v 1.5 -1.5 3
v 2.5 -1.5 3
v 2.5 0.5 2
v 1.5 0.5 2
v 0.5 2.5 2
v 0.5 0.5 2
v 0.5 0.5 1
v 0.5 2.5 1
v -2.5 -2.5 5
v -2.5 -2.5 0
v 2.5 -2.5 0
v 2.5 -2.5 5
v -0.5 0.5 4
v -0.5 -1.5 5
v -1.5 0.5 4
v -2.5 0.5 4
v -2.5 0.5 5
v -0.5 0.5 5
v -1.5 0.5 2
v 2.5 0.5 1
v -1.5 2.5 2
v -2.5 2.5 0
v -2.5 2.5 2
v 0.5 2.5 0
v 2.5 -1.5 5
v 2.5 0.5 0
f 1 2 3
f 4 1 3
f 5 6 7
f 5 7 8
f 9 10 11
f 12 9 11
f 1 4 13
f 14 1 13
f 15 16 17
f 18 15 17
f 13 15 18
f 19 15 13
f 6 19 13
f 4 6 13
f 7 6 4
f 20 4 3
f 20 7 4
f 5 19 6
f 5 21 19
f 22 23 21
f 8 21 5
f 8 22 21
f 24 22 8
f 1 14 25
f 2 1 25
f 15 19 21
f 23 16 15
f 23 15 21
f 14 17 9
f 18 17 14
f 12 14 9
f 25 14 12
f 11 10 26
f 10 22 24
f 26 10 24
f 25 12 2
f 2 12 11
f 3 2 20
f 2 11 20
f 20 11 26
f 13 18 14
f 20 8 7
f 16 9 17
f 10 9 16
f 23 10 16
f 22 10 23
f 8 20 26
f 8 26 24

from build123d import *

# Parameters (mm, degrees)
SKETCH1_W           = 5
SKETCH1_H           = 5
BOSS_EXTRUDE1_DEPTH = 5
CUT_EXTRUDE1_DEPTH  = 2
CUT_EXTRUDE2_DEPTH  = 1
SKETCH4_W           = 3
SKETCH4_H           = 2
CUT_EXTRUDE3_DEPTH  = 3
SKETCH5_W           = 2
SKETCH5_H           = 2
CUT_EXTRUDE4_DEPTH  = 1
CUT_EXTRUDE5_DEPTH  = 1
CUT_EXTRUDE6_DEPTH  = 2
CUT_EXTRUDE7_DEPTH  = 1
CUT_EXTRUDE8_DEPTH  = 3
CUT_EXTRUDE9_DEPTH  = 3


with BuildPart() as part:
    # Sketch1 → Boss-Extrude1 (new body)
    with BuildSketch(Plane.XY):
        Rectangle(SKETCH1_W, SKETCH1_H)
    extrude(amount=BOSS_EXTRUDE1_DEPTH)

    # Sketch2 → Cut-Extrude1 (cut)
    with BuildSketch(Plane(origin=(0, 2.5, 0), x_dir=(1, 0, 0), z_dir=(0, 1, 0))):
        Polygon((-2.5, -5), (-0.5, -5), (-0.5, -2), (-1.5, -2), (-1.5, -4), (-2.5, -4), align=None)
    extrude(amount=-CUT_EXTRUDE1_DEPTH, mode=Mode.SUBTRACT)

    # Sketch3 → Cut-Extrude2 (cut)
    with BuildSketch(Plane.ZY.offset(2.5)):
        Polygon((4, 0.5), (2, 2.5), (4, 2.5), align=None)
    extrude(amount=-CUT_EXTRUDE2_DEPTH, mode=Mode.SUBTRACT)

    # Sketch4 → Cut-Extrude3 (cut)
    with BuildSketch(Plane.XY.offset(5)):
        with Locations((1, 1.5)):
            Rectangle(SKETCH4_W, SKETCH4_H)
    extrude(amount=-CUT_EXTRUDE3_DEPTH, mode=Mode.SUBTRACT)

    # Sketch5 → Cut-Extrude4 (cut)
    with BuildSketch(Plane.XY.offset(2)):
        with Locations((1.5, 1.5)):
            Rectangle(SKETCH5_W, SKETCH5_H)
    extrude(amount=-CUT_EXTRUDE4_DEPTH, mode=Mode.SUBTRACT)

    # Sketch6 → Cut-Extrude5 (cut)
    with BuildSketch(Plane.XY.offset(1)):
        Polygon((2.5, 0.5), (0.5, 2.5), (2.5, 2.5), align=None)
    extrude(amount=-CUT_EXTRUDE5_DEPTH, mode=Mode.SUBTRACT)

    # Sketch7 → Cut-Extrude6 (cut)
    with BuildSketch(Plane(origin=(0, 0.5, 0), x_dir=(1, 0, 0), z_dir=(0, 1, 0))):
        Polygon((2.5, -5), (2.5, -3), (1.5, -3), (-0.5, -5), align=None)
    extrude(amount=-CUT_EXTRUDE6_DEPTH, mode=Mode.SUBTRACT)

    # Sketch8 → Cut-Extrude7 (cut)
    with BuildSketch(Plane(origin=(2.5, 0, 0), x_dir=(0, 0, -1), z_dir=(1, 0, 0))):
        Polygon((-3, -1.5), (-2, 0.5), (-3, 0.5), align=None)
    extrude(amount=-CUT_EXTRUDE7_DEPTH, mode=Mode.SUBTRACT)

    # Sketch9 → Cut-Extrude8 (cut)
    with BuildSketch(Plane(origin=(2.5, 0, 0), x_dir=(0, 0, -1), z_dir=(1, 0, 0))):
        Polygon((-5, -1.5), (-4, 0.5), (-5, 0.5), align=None)
    extrude(amount=-CUT_EXTRUDE8_DEPTH, mode=Mode.SUBTRACT)

    # Sketch11 → Cut-Extrude9 (cut)
    with BuildSketch(Plane(origin=(1.666666667, 0.833333333, 1.666666667), x_dir=(-0.745355992, 0.298142397, 0.596284794), z_dir=(-0.666666667, -0.333333333, -0.666666667))):
        Polygon((2.906888371, -1.341640786), (0.223606798, -0.447213595), (0.223606798, -2.683281573), (2.906888371, -3.577708764), align=None)
    extrude(amount=-CUT_EXTRUDE9_DEPTH, mode=Mode.SUBTRACT)


solid = part.part
